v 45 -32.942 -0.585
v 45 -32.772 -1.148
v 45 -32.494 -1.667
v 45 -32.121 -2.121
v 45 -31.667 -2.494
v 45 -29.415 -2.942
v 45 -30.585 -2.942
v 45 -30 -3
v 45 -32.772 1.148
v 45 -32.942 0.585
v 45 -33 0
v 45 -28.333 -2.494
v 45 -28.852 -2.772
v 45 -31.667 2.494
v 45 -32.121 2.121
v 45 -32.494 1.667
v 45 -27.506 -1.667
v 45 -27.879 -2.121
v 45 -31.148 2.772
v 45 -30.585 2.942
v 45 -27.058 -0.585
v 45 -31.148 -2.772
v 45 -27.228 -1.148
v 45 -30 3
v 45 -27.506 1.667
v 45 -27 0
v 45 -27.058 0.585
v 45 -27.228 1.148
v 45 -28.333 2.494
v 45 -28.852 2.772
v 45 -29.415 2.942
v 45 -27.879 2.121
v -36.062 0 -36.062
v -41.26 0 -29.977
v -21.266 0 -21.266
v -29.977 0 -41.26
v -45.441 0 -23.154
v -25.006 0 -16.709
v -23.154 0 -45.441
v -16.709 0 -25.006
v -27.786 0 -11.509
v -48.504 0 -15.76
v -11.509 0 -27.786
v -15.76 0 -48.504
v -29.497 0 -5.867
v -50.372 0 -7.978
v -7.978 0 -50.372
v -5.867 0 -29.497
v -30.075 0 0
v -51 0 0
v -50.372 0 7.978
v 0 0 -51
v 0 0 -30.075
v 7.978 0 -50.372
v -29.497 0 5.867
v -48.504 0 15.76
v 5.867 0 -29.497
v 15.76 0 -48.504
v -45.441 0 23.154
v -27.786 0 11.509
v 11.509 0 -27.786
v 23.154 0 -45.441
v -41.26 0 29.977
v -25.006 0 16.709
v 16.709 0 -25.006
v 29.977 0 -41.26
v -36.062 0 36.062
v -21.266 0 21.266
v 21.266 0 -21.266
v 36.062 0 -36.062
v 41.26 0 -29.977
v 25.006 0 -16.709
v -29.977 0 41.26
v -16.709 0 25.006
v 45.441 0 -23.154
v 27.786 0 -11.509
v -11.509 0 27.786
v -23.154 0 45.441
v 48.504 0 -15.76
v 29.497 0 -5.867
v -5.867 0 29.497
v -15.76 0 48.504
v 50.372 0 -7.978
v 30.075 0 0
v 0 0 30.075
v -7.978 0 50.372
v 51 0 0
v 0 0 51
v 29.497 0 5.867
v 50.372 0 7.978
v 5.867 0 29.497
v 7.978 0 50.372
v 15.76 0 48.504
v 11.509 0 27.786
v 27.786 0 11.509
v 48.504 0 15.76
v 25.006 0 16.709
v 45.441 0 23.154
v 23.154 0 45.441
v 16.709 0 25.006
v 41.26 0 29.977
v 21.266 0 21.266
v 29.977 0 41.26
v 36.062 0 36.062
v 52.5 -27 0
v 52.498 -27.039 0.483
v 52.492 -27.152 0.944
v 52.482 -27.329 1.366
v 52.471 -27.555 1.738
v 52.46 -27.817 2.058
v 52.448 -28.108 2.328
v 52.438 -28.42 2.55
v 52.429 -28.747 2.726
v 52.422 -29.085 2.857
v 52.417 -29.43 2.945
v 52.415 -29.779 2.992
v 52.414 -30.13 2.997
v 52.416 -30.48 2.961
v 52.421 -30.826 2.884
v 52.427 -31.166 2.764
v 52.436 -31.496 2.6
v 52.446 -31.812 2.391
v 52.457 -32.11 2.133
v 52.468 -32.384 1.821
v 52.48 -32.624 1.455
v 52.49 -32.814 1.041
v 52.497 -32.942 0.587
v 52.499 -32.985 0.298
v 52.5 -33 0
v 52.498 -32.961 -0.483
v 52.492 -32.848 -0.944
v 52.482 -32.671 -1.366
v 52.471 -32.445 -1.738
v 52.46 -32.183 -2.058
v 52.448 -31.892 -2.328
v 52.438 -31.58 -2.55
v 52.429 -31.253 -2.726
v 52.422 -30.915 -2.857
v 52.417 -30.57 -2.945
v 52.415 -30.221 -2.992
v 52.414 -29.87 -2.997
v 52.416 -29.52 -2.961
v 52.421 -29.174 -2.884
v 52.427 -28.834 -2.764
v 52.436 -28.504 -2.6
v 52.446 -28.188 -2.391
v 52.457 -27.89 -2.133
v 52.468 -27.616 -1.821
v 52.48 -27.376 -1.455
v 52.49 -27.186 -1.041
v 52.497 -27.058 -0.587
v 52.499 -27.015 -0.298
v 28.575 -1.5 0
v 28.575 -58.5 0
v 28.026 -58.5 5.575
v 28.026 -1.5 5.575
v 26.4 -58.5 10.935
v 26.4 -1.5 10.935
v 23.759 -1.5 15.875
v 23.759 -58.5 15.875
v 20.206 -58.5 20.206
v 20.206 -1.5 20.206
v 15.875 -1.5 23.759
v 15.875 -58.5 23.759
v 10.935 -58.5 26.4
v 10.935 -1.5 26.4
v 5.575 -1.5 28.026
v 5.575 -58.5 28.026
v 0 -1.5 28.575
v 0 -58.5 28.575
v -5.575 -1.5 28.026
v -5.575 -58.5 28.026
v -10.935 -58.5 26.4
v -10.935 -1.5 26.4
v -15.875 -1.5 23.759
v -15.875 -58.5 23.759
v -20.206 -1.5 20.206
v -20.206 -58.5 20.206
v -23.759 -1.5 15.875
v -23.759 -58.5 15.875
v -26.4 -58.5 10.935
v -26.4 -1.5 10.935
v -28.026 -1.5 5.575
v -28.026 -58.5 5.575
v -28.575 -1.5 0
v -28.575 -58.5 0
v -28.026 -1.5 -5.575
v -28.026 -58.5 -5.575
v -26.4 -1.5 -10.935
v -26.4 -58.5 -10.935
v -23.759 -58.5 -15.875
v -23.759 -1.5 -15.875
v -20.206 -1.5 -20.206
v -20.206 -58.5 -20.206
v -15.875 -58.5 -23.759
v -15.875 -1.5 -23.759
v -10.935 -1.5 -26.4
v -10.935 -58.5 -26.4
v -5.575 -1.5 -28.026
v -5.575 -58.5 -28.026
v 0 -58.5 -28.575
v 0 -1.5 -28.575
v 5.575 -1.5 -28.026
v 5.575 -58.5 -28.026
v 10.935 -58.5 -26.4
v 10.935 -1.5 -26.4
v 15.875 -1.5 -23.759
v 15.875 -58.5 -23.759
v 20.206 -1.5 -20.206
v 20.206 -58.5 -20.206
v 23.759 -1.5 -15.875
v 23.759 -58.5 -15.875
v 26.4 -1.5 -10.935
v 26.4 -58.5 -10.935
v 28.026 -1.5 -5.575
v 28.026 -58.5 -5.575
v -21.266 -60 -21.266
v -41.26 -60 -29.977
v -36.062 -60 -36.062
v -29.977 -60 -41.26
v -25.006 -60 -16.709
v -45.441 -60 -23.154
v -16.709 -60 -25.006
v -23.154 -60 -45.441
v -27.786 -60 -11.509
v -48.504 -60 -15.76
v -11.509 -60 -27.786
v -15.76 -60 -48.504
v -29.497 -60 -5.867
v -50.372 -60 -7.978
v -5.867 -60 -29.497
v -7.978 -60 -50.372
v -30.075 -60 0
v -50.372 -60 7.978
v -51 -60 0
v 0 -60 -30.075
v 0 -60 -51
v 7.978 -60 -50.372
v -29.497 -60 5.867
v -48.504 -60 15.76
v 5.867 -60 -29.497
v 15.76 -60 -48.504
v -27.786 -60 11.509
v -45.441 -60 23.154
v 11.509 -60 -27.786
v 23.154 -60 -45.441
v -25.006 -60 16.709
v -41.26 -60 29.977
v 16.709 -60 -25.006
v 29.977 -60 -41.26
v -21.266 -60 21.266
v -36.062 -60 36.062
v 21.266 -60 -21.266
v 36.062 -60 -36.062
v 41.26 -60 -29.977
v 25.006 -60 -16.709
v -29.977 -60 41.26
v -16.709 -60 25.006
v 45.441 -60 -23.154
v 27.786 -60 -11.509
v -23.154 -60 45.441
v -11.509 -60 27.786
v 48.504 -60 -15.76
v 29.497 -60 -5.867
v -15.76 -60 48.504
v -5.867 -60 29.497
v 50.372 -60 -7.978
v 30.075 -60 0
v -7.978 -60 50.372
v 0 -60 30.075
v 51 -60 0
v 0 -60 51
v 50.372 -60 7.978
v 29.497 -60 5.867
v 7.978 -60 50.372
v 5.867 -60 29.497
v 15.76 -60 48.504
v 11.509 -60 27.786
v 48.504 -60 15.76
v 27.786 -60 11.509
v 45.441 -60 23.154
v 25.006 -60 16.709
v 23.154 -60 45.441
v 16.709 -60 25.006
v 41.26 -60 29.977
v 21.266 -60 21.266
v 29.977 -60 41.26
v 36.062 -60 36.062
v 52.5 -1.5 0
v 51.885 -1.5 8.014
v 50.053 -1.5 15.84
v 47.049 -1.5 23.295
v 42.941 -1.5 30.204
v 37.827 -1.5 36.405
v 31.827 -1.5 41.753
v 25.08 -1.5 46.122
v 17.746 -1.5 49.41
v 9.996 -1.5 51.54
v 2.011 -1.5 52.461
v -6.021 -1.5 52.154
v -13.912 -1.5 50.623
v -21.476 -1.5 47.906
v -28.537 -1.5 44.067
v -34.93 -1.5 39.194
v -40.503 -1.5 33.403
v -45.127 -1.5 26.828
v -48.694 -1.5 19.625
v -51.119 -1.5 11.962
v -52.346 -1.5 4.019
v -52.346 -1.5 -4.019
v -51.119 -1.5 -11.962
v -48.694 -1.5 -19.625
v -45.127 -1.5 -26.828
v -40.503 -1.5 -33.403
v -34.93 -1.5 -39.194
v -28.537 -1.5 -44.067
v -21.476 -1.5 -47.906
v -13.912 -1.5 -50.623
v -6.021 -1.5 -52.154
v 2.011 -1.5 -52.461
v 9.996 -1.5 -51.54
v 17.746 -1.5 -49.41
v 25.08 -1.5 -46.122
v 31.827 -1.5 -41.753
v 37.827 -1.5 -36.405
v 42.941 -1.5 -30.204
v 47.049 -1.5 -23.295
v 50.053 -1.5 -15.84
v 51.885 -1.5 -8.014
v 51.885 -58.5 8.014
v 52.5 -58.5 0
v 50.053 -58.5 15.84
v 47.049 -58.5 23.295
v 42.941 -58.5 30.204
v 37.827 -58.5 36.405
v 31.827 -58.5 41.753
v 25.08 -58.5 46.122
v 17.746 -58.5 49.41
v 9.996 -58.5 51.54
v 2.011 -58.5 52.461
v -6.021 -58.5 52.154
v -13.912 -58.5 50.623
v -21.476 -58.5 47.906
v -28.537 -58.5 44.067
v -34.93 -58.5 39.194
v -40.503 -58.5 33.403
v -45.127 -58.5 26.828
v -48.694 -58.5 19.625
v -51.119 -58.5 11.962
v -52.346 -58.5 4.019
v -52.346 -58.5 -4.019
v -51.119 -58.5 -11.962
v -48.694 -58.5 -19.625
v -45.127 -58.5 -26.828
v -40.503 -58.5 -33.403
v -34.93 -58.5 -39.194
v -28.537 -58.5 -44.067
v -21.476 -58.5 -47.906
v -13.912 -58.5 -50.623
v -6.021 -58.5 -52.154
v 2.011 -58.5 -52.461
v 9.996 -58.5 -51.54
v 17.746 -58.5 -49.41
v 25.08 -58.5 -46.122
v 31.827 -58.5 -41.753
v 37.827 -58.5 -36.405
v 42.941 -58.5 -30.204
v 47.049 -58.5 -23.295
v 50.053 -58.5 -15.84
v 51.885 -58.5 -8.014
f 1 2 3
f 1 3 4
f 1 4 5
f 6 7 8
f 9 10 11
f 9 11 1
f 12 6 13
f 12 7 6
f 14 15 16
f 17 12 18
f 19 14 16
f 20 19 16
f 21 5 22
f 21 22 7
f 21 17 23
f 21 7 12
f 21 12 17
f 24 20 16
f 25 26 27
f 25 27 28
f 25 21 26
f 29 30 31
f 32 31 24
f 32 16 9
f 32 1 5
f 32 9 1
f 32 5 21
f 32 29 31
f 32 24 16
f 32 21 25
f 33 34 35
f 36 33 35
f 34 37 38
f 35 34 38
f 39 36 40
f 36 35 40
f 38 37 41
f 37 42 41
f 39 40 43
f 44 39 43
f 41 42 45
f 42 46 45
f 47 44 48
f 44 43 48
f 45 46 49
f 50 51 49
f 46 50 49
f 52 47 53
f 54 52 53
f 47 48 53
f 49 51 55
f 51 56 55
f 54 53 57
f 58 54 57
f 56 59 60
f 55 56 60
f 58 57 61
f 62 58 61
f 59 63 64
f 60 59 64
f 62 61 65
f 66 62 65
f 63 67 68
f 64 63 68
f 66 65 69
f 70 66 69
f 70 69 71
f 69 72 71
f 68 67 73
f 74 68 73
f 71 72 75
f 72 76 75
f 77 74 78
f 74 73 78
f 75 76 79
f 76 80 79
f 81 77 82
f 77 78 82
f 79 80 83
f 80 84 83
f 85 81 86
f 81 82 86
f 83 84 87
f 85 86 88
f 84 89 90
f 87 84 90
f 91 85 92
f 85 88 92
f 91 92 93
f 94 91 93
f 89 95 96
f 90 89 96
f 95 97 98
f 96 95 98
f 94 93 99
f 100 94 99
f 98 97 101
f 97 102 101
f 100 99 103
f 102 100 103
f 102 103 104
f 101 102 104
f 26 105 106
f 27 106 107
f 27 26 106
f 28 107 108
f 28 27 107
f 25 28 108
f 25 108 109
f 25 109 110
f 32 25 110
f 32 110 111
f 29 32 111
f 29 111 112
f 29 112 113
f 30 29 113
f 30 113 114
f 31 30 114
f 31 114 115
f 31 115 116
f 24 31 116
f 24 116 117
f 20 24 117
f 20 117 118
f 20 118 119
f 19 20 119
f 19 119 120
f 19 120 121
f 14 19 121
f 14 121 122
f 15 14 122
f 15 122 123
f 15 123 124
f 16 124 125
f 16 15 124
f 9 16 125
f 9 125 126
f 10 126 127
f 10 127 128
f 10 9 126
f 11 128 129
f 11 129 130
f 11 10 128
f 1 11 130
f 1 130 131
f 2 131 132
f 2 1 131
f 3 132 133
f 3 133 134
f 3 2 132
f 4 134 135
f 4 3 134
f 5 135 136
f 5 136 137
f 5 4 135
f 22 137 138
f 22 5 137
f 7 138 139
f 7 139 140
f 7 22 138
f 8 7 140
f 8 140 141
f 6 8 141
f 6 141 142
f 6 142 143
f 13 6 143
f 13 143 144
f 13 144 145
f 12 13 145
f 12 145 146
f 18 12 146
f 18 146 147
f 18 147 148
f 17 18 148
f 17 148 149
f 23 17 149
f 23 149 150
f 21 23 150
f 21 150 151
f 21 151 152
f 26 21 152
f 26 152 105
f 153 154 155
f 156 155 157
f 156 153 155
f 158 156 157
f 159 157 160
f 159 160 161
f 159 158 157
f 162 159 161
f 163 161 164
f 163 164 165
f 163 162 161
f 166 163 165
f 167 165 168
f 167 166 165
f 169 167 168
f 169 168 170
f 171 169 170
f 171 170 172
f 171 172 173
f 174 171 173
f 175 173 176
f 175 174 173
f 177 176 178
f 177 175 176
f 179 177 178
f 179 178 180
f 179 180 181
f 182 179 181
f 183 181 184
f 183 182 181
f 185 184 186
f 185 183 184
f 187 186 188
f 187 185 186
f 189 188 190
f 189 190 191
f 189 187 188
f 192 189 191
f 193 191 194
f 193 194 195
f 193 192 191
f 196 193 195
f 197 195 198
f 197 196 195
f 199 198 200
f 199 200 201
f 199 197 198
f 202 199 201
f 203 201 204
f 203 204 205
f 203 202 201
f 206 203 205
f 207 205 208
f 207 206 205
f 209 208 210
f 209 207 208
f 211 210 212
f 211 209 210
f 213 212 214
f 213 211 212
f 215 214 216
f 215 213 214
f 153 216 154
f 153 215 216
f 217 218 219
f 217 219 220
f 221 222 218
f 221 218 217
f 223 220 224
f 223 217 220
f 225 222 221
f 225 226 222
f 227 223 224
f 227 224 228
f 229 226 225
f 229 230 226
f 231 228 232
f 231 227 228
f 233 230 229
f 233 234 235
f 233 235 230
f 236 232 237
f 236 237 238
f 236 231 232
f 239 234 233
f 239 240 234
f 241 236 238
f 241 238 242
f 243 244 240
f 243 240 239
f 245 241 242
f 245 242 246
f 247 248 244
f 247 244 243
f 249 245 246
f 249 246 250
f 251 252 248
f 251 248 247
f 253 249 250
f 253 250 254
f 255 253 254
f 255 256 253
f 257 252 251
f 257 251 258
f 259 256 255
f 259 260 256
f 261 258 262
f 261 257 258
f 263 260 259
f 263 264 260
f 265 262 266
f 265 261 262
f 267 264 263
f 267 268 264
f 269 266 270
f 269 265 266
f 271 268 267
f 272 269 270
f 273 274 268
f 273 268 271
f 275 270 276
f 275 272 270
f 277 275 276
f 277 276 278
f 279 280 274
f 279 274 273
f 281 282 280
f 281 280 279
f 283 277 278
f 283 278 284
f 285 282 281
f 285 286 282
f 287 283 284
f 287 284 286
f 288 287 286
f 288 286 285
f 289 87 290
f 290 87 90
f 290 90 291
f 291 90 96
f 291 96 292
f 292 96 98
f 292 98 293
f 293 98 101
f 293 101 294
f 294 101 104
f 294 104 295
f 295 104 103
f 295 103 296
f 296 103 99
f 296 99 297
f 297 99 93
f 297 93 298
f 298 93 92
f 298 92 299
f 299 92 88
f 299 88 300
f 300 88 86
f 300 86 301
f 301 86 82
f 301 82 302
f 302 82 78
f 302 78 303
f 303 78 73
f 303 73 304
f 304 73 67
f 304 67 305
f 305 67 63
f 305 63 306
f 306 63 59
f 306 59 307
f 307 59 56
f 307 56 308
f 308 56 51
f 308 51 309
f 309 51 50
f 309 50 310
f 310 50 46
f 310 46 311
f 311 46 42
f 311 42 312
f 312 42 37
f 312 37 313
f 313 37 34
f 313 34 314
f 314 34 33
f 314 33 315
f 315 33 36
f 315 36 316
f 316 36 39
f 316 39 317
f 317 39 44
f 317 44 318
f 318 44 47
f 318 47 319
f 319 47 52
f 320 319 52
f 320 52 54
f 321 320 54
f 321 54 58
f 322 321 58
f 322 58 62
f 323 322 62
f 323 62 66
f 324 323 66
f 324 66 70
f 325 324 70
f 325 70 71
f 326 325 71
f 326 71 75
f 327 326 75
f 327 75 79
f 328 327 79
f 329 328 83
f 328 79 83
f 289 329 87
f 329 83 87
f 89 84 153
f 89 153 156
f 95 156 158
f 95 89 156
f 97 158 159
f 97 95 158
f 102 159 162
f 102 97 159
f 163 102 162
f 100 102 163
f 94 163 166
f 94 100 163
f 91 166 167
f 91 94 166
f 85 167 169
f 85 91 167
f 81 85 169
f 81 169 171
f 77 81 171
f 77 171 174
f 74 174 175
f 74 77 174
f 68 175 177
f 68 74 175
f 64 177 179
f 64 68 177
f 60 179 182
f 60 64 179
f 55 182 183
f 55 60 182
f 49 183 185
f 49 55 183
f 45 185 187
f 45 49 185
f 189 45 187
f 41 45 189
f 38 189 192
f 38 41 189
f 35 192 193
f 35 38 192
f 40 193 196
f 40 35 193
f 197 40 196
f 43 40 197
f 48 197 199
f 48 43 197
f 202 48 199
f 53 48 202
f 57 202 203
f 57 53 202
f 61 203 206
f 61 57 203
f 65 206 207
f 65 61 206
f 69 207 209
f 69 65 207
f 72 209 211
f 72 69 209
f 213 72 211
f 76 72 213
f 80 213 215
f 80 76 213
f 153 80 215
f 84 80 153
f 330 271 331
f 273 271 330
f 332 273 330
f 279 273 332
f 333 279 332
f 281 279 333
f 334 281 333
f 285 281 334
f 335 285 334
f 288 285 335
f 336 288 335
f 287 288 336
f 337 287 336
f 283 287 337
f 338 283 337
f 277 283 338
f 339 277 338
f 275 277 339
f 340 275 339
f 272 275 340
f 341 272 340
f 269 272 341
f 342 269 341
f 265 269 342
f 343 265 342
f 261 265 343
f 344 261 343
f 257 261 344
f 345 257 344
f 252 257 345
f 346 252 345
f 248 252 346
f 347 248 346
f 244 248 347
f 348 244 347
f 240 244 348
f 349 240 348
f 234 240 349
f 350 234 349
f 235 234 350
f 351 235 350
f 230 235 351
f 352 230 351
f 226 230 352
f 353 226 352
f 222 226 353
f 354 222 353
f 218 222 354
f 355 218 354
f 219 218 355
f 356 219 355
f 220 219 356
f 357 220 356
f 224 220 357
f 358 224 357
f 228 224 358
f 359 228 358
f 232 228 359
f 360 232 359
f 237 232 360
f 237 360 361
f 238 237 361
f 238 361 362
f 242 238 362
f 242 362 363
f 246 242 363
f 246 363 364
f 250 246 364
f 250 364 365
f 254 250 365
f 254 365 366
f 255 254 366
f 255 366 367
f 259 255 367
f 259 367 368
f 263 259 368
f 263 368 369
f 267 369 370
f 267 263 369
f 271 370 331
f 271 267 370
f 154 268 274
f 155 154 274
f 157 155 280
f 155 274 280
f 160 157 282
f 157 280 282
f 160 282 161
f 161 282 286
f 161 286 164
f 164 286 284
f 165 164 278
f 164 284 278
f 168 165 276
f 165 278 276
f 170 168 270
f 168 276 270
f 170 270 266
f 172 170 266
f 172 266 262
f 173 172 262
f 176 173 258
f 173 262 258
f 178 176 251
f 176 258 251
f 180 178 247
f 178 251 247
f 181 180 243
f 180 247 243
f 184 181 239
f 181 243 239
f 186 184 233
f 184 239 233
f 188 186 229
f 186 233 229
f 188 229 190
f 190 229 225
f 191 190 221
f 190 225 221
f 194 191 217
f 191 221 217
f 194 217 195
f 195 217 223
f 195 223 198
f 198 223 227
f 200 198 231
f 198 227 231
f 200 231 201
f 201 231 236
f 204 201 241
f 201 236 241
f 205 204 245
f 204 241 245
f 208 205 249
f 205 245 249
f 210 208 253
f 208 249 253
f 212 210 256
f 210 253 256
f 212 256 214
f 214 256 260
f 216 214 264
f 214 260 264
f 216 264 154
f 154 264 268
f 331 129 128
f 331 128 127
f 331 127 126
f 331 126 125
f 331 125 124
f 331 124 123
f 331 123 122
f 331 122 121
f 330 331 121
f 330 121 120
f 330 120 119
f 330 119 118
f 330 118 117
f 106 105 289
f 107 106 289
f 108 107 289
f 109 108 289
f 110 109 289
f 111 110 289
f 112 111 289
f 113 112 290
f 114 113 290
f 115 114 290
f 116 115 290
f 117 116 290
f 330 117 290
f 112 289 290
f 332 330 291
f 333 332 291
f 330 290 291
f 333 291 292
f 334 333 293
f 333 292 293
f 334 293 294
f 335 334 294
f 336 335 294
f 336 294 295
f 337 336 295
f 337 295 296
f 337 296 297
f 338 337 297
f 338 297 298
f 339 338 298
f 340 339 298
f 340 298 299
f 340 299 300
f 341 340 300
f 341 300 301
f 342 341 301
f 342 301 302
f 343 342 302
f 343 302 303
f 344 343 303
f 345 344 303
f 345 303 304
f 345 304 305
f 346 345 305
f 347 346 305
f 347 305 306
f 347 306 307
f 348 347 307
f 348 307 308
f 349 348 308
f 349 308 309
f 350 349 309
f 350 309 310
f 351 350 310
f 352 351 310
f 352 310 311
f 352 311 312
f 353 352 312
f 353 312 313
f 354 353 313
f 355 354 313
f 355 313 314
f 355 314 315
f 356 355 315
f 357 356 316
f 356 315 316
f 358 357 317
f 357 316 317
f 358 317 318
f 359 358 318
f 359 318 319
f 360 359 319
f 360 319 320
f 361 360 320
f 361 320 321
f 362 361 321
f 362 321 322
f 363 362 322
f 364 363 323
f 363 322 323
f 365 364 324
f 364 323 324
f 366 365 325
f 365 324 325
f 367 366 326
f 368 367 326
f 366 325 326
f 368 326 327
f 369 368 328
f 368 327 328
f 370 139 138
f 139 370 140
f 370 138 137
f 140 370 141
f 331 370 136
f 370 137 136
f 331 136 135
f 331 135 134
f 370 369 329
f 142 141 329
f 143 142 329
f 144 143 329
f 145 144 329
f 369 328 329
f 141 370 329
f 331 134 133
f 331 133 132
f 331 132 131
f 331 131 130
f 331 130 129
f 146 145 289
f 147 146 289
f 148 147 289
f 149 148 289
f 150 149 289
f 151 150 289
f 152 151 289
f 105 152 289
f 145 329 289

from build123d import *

# Parameters (mm, degrees)
F0_R     = 52.5
F0_R_2   = 28.575
F1_DEPTH = 60
F2_SIZE  = 1.5
F4_START = 45
F3_R     = 3
F4_DEPTH = 10


with BuildPart() as f1:
    # F0 (on Front) → F1 (new body)
    with BuildSketch(Plane.XZ):
        Circle(F0_R)
        Circle(F0_R_2, mode=Mode.SUBTRACT)
    extrude(amount=F1_DEPTH)

    # F2
    f2_edges = [f1.edges().sort_by_distance(p)[0] for p in [
        (-52.5, -60, 0),
        (-28.575, -60, 0),
        (-52.5, 0, 0),
        (-28.575, 0, 0),
    ]]
    chamfer(f2_edges, length=F2_SIZE)

    # F3 (on Right) → F4 (cut)
    with BuildSketch(Plane.YZ.offset(F4_START)):
        with Locations((-30, 0)):
            Circle(F3_R)
    extrude(amount=F4_DEPTH, mode=Mode.SUBTRACT)


solid = f1.part
